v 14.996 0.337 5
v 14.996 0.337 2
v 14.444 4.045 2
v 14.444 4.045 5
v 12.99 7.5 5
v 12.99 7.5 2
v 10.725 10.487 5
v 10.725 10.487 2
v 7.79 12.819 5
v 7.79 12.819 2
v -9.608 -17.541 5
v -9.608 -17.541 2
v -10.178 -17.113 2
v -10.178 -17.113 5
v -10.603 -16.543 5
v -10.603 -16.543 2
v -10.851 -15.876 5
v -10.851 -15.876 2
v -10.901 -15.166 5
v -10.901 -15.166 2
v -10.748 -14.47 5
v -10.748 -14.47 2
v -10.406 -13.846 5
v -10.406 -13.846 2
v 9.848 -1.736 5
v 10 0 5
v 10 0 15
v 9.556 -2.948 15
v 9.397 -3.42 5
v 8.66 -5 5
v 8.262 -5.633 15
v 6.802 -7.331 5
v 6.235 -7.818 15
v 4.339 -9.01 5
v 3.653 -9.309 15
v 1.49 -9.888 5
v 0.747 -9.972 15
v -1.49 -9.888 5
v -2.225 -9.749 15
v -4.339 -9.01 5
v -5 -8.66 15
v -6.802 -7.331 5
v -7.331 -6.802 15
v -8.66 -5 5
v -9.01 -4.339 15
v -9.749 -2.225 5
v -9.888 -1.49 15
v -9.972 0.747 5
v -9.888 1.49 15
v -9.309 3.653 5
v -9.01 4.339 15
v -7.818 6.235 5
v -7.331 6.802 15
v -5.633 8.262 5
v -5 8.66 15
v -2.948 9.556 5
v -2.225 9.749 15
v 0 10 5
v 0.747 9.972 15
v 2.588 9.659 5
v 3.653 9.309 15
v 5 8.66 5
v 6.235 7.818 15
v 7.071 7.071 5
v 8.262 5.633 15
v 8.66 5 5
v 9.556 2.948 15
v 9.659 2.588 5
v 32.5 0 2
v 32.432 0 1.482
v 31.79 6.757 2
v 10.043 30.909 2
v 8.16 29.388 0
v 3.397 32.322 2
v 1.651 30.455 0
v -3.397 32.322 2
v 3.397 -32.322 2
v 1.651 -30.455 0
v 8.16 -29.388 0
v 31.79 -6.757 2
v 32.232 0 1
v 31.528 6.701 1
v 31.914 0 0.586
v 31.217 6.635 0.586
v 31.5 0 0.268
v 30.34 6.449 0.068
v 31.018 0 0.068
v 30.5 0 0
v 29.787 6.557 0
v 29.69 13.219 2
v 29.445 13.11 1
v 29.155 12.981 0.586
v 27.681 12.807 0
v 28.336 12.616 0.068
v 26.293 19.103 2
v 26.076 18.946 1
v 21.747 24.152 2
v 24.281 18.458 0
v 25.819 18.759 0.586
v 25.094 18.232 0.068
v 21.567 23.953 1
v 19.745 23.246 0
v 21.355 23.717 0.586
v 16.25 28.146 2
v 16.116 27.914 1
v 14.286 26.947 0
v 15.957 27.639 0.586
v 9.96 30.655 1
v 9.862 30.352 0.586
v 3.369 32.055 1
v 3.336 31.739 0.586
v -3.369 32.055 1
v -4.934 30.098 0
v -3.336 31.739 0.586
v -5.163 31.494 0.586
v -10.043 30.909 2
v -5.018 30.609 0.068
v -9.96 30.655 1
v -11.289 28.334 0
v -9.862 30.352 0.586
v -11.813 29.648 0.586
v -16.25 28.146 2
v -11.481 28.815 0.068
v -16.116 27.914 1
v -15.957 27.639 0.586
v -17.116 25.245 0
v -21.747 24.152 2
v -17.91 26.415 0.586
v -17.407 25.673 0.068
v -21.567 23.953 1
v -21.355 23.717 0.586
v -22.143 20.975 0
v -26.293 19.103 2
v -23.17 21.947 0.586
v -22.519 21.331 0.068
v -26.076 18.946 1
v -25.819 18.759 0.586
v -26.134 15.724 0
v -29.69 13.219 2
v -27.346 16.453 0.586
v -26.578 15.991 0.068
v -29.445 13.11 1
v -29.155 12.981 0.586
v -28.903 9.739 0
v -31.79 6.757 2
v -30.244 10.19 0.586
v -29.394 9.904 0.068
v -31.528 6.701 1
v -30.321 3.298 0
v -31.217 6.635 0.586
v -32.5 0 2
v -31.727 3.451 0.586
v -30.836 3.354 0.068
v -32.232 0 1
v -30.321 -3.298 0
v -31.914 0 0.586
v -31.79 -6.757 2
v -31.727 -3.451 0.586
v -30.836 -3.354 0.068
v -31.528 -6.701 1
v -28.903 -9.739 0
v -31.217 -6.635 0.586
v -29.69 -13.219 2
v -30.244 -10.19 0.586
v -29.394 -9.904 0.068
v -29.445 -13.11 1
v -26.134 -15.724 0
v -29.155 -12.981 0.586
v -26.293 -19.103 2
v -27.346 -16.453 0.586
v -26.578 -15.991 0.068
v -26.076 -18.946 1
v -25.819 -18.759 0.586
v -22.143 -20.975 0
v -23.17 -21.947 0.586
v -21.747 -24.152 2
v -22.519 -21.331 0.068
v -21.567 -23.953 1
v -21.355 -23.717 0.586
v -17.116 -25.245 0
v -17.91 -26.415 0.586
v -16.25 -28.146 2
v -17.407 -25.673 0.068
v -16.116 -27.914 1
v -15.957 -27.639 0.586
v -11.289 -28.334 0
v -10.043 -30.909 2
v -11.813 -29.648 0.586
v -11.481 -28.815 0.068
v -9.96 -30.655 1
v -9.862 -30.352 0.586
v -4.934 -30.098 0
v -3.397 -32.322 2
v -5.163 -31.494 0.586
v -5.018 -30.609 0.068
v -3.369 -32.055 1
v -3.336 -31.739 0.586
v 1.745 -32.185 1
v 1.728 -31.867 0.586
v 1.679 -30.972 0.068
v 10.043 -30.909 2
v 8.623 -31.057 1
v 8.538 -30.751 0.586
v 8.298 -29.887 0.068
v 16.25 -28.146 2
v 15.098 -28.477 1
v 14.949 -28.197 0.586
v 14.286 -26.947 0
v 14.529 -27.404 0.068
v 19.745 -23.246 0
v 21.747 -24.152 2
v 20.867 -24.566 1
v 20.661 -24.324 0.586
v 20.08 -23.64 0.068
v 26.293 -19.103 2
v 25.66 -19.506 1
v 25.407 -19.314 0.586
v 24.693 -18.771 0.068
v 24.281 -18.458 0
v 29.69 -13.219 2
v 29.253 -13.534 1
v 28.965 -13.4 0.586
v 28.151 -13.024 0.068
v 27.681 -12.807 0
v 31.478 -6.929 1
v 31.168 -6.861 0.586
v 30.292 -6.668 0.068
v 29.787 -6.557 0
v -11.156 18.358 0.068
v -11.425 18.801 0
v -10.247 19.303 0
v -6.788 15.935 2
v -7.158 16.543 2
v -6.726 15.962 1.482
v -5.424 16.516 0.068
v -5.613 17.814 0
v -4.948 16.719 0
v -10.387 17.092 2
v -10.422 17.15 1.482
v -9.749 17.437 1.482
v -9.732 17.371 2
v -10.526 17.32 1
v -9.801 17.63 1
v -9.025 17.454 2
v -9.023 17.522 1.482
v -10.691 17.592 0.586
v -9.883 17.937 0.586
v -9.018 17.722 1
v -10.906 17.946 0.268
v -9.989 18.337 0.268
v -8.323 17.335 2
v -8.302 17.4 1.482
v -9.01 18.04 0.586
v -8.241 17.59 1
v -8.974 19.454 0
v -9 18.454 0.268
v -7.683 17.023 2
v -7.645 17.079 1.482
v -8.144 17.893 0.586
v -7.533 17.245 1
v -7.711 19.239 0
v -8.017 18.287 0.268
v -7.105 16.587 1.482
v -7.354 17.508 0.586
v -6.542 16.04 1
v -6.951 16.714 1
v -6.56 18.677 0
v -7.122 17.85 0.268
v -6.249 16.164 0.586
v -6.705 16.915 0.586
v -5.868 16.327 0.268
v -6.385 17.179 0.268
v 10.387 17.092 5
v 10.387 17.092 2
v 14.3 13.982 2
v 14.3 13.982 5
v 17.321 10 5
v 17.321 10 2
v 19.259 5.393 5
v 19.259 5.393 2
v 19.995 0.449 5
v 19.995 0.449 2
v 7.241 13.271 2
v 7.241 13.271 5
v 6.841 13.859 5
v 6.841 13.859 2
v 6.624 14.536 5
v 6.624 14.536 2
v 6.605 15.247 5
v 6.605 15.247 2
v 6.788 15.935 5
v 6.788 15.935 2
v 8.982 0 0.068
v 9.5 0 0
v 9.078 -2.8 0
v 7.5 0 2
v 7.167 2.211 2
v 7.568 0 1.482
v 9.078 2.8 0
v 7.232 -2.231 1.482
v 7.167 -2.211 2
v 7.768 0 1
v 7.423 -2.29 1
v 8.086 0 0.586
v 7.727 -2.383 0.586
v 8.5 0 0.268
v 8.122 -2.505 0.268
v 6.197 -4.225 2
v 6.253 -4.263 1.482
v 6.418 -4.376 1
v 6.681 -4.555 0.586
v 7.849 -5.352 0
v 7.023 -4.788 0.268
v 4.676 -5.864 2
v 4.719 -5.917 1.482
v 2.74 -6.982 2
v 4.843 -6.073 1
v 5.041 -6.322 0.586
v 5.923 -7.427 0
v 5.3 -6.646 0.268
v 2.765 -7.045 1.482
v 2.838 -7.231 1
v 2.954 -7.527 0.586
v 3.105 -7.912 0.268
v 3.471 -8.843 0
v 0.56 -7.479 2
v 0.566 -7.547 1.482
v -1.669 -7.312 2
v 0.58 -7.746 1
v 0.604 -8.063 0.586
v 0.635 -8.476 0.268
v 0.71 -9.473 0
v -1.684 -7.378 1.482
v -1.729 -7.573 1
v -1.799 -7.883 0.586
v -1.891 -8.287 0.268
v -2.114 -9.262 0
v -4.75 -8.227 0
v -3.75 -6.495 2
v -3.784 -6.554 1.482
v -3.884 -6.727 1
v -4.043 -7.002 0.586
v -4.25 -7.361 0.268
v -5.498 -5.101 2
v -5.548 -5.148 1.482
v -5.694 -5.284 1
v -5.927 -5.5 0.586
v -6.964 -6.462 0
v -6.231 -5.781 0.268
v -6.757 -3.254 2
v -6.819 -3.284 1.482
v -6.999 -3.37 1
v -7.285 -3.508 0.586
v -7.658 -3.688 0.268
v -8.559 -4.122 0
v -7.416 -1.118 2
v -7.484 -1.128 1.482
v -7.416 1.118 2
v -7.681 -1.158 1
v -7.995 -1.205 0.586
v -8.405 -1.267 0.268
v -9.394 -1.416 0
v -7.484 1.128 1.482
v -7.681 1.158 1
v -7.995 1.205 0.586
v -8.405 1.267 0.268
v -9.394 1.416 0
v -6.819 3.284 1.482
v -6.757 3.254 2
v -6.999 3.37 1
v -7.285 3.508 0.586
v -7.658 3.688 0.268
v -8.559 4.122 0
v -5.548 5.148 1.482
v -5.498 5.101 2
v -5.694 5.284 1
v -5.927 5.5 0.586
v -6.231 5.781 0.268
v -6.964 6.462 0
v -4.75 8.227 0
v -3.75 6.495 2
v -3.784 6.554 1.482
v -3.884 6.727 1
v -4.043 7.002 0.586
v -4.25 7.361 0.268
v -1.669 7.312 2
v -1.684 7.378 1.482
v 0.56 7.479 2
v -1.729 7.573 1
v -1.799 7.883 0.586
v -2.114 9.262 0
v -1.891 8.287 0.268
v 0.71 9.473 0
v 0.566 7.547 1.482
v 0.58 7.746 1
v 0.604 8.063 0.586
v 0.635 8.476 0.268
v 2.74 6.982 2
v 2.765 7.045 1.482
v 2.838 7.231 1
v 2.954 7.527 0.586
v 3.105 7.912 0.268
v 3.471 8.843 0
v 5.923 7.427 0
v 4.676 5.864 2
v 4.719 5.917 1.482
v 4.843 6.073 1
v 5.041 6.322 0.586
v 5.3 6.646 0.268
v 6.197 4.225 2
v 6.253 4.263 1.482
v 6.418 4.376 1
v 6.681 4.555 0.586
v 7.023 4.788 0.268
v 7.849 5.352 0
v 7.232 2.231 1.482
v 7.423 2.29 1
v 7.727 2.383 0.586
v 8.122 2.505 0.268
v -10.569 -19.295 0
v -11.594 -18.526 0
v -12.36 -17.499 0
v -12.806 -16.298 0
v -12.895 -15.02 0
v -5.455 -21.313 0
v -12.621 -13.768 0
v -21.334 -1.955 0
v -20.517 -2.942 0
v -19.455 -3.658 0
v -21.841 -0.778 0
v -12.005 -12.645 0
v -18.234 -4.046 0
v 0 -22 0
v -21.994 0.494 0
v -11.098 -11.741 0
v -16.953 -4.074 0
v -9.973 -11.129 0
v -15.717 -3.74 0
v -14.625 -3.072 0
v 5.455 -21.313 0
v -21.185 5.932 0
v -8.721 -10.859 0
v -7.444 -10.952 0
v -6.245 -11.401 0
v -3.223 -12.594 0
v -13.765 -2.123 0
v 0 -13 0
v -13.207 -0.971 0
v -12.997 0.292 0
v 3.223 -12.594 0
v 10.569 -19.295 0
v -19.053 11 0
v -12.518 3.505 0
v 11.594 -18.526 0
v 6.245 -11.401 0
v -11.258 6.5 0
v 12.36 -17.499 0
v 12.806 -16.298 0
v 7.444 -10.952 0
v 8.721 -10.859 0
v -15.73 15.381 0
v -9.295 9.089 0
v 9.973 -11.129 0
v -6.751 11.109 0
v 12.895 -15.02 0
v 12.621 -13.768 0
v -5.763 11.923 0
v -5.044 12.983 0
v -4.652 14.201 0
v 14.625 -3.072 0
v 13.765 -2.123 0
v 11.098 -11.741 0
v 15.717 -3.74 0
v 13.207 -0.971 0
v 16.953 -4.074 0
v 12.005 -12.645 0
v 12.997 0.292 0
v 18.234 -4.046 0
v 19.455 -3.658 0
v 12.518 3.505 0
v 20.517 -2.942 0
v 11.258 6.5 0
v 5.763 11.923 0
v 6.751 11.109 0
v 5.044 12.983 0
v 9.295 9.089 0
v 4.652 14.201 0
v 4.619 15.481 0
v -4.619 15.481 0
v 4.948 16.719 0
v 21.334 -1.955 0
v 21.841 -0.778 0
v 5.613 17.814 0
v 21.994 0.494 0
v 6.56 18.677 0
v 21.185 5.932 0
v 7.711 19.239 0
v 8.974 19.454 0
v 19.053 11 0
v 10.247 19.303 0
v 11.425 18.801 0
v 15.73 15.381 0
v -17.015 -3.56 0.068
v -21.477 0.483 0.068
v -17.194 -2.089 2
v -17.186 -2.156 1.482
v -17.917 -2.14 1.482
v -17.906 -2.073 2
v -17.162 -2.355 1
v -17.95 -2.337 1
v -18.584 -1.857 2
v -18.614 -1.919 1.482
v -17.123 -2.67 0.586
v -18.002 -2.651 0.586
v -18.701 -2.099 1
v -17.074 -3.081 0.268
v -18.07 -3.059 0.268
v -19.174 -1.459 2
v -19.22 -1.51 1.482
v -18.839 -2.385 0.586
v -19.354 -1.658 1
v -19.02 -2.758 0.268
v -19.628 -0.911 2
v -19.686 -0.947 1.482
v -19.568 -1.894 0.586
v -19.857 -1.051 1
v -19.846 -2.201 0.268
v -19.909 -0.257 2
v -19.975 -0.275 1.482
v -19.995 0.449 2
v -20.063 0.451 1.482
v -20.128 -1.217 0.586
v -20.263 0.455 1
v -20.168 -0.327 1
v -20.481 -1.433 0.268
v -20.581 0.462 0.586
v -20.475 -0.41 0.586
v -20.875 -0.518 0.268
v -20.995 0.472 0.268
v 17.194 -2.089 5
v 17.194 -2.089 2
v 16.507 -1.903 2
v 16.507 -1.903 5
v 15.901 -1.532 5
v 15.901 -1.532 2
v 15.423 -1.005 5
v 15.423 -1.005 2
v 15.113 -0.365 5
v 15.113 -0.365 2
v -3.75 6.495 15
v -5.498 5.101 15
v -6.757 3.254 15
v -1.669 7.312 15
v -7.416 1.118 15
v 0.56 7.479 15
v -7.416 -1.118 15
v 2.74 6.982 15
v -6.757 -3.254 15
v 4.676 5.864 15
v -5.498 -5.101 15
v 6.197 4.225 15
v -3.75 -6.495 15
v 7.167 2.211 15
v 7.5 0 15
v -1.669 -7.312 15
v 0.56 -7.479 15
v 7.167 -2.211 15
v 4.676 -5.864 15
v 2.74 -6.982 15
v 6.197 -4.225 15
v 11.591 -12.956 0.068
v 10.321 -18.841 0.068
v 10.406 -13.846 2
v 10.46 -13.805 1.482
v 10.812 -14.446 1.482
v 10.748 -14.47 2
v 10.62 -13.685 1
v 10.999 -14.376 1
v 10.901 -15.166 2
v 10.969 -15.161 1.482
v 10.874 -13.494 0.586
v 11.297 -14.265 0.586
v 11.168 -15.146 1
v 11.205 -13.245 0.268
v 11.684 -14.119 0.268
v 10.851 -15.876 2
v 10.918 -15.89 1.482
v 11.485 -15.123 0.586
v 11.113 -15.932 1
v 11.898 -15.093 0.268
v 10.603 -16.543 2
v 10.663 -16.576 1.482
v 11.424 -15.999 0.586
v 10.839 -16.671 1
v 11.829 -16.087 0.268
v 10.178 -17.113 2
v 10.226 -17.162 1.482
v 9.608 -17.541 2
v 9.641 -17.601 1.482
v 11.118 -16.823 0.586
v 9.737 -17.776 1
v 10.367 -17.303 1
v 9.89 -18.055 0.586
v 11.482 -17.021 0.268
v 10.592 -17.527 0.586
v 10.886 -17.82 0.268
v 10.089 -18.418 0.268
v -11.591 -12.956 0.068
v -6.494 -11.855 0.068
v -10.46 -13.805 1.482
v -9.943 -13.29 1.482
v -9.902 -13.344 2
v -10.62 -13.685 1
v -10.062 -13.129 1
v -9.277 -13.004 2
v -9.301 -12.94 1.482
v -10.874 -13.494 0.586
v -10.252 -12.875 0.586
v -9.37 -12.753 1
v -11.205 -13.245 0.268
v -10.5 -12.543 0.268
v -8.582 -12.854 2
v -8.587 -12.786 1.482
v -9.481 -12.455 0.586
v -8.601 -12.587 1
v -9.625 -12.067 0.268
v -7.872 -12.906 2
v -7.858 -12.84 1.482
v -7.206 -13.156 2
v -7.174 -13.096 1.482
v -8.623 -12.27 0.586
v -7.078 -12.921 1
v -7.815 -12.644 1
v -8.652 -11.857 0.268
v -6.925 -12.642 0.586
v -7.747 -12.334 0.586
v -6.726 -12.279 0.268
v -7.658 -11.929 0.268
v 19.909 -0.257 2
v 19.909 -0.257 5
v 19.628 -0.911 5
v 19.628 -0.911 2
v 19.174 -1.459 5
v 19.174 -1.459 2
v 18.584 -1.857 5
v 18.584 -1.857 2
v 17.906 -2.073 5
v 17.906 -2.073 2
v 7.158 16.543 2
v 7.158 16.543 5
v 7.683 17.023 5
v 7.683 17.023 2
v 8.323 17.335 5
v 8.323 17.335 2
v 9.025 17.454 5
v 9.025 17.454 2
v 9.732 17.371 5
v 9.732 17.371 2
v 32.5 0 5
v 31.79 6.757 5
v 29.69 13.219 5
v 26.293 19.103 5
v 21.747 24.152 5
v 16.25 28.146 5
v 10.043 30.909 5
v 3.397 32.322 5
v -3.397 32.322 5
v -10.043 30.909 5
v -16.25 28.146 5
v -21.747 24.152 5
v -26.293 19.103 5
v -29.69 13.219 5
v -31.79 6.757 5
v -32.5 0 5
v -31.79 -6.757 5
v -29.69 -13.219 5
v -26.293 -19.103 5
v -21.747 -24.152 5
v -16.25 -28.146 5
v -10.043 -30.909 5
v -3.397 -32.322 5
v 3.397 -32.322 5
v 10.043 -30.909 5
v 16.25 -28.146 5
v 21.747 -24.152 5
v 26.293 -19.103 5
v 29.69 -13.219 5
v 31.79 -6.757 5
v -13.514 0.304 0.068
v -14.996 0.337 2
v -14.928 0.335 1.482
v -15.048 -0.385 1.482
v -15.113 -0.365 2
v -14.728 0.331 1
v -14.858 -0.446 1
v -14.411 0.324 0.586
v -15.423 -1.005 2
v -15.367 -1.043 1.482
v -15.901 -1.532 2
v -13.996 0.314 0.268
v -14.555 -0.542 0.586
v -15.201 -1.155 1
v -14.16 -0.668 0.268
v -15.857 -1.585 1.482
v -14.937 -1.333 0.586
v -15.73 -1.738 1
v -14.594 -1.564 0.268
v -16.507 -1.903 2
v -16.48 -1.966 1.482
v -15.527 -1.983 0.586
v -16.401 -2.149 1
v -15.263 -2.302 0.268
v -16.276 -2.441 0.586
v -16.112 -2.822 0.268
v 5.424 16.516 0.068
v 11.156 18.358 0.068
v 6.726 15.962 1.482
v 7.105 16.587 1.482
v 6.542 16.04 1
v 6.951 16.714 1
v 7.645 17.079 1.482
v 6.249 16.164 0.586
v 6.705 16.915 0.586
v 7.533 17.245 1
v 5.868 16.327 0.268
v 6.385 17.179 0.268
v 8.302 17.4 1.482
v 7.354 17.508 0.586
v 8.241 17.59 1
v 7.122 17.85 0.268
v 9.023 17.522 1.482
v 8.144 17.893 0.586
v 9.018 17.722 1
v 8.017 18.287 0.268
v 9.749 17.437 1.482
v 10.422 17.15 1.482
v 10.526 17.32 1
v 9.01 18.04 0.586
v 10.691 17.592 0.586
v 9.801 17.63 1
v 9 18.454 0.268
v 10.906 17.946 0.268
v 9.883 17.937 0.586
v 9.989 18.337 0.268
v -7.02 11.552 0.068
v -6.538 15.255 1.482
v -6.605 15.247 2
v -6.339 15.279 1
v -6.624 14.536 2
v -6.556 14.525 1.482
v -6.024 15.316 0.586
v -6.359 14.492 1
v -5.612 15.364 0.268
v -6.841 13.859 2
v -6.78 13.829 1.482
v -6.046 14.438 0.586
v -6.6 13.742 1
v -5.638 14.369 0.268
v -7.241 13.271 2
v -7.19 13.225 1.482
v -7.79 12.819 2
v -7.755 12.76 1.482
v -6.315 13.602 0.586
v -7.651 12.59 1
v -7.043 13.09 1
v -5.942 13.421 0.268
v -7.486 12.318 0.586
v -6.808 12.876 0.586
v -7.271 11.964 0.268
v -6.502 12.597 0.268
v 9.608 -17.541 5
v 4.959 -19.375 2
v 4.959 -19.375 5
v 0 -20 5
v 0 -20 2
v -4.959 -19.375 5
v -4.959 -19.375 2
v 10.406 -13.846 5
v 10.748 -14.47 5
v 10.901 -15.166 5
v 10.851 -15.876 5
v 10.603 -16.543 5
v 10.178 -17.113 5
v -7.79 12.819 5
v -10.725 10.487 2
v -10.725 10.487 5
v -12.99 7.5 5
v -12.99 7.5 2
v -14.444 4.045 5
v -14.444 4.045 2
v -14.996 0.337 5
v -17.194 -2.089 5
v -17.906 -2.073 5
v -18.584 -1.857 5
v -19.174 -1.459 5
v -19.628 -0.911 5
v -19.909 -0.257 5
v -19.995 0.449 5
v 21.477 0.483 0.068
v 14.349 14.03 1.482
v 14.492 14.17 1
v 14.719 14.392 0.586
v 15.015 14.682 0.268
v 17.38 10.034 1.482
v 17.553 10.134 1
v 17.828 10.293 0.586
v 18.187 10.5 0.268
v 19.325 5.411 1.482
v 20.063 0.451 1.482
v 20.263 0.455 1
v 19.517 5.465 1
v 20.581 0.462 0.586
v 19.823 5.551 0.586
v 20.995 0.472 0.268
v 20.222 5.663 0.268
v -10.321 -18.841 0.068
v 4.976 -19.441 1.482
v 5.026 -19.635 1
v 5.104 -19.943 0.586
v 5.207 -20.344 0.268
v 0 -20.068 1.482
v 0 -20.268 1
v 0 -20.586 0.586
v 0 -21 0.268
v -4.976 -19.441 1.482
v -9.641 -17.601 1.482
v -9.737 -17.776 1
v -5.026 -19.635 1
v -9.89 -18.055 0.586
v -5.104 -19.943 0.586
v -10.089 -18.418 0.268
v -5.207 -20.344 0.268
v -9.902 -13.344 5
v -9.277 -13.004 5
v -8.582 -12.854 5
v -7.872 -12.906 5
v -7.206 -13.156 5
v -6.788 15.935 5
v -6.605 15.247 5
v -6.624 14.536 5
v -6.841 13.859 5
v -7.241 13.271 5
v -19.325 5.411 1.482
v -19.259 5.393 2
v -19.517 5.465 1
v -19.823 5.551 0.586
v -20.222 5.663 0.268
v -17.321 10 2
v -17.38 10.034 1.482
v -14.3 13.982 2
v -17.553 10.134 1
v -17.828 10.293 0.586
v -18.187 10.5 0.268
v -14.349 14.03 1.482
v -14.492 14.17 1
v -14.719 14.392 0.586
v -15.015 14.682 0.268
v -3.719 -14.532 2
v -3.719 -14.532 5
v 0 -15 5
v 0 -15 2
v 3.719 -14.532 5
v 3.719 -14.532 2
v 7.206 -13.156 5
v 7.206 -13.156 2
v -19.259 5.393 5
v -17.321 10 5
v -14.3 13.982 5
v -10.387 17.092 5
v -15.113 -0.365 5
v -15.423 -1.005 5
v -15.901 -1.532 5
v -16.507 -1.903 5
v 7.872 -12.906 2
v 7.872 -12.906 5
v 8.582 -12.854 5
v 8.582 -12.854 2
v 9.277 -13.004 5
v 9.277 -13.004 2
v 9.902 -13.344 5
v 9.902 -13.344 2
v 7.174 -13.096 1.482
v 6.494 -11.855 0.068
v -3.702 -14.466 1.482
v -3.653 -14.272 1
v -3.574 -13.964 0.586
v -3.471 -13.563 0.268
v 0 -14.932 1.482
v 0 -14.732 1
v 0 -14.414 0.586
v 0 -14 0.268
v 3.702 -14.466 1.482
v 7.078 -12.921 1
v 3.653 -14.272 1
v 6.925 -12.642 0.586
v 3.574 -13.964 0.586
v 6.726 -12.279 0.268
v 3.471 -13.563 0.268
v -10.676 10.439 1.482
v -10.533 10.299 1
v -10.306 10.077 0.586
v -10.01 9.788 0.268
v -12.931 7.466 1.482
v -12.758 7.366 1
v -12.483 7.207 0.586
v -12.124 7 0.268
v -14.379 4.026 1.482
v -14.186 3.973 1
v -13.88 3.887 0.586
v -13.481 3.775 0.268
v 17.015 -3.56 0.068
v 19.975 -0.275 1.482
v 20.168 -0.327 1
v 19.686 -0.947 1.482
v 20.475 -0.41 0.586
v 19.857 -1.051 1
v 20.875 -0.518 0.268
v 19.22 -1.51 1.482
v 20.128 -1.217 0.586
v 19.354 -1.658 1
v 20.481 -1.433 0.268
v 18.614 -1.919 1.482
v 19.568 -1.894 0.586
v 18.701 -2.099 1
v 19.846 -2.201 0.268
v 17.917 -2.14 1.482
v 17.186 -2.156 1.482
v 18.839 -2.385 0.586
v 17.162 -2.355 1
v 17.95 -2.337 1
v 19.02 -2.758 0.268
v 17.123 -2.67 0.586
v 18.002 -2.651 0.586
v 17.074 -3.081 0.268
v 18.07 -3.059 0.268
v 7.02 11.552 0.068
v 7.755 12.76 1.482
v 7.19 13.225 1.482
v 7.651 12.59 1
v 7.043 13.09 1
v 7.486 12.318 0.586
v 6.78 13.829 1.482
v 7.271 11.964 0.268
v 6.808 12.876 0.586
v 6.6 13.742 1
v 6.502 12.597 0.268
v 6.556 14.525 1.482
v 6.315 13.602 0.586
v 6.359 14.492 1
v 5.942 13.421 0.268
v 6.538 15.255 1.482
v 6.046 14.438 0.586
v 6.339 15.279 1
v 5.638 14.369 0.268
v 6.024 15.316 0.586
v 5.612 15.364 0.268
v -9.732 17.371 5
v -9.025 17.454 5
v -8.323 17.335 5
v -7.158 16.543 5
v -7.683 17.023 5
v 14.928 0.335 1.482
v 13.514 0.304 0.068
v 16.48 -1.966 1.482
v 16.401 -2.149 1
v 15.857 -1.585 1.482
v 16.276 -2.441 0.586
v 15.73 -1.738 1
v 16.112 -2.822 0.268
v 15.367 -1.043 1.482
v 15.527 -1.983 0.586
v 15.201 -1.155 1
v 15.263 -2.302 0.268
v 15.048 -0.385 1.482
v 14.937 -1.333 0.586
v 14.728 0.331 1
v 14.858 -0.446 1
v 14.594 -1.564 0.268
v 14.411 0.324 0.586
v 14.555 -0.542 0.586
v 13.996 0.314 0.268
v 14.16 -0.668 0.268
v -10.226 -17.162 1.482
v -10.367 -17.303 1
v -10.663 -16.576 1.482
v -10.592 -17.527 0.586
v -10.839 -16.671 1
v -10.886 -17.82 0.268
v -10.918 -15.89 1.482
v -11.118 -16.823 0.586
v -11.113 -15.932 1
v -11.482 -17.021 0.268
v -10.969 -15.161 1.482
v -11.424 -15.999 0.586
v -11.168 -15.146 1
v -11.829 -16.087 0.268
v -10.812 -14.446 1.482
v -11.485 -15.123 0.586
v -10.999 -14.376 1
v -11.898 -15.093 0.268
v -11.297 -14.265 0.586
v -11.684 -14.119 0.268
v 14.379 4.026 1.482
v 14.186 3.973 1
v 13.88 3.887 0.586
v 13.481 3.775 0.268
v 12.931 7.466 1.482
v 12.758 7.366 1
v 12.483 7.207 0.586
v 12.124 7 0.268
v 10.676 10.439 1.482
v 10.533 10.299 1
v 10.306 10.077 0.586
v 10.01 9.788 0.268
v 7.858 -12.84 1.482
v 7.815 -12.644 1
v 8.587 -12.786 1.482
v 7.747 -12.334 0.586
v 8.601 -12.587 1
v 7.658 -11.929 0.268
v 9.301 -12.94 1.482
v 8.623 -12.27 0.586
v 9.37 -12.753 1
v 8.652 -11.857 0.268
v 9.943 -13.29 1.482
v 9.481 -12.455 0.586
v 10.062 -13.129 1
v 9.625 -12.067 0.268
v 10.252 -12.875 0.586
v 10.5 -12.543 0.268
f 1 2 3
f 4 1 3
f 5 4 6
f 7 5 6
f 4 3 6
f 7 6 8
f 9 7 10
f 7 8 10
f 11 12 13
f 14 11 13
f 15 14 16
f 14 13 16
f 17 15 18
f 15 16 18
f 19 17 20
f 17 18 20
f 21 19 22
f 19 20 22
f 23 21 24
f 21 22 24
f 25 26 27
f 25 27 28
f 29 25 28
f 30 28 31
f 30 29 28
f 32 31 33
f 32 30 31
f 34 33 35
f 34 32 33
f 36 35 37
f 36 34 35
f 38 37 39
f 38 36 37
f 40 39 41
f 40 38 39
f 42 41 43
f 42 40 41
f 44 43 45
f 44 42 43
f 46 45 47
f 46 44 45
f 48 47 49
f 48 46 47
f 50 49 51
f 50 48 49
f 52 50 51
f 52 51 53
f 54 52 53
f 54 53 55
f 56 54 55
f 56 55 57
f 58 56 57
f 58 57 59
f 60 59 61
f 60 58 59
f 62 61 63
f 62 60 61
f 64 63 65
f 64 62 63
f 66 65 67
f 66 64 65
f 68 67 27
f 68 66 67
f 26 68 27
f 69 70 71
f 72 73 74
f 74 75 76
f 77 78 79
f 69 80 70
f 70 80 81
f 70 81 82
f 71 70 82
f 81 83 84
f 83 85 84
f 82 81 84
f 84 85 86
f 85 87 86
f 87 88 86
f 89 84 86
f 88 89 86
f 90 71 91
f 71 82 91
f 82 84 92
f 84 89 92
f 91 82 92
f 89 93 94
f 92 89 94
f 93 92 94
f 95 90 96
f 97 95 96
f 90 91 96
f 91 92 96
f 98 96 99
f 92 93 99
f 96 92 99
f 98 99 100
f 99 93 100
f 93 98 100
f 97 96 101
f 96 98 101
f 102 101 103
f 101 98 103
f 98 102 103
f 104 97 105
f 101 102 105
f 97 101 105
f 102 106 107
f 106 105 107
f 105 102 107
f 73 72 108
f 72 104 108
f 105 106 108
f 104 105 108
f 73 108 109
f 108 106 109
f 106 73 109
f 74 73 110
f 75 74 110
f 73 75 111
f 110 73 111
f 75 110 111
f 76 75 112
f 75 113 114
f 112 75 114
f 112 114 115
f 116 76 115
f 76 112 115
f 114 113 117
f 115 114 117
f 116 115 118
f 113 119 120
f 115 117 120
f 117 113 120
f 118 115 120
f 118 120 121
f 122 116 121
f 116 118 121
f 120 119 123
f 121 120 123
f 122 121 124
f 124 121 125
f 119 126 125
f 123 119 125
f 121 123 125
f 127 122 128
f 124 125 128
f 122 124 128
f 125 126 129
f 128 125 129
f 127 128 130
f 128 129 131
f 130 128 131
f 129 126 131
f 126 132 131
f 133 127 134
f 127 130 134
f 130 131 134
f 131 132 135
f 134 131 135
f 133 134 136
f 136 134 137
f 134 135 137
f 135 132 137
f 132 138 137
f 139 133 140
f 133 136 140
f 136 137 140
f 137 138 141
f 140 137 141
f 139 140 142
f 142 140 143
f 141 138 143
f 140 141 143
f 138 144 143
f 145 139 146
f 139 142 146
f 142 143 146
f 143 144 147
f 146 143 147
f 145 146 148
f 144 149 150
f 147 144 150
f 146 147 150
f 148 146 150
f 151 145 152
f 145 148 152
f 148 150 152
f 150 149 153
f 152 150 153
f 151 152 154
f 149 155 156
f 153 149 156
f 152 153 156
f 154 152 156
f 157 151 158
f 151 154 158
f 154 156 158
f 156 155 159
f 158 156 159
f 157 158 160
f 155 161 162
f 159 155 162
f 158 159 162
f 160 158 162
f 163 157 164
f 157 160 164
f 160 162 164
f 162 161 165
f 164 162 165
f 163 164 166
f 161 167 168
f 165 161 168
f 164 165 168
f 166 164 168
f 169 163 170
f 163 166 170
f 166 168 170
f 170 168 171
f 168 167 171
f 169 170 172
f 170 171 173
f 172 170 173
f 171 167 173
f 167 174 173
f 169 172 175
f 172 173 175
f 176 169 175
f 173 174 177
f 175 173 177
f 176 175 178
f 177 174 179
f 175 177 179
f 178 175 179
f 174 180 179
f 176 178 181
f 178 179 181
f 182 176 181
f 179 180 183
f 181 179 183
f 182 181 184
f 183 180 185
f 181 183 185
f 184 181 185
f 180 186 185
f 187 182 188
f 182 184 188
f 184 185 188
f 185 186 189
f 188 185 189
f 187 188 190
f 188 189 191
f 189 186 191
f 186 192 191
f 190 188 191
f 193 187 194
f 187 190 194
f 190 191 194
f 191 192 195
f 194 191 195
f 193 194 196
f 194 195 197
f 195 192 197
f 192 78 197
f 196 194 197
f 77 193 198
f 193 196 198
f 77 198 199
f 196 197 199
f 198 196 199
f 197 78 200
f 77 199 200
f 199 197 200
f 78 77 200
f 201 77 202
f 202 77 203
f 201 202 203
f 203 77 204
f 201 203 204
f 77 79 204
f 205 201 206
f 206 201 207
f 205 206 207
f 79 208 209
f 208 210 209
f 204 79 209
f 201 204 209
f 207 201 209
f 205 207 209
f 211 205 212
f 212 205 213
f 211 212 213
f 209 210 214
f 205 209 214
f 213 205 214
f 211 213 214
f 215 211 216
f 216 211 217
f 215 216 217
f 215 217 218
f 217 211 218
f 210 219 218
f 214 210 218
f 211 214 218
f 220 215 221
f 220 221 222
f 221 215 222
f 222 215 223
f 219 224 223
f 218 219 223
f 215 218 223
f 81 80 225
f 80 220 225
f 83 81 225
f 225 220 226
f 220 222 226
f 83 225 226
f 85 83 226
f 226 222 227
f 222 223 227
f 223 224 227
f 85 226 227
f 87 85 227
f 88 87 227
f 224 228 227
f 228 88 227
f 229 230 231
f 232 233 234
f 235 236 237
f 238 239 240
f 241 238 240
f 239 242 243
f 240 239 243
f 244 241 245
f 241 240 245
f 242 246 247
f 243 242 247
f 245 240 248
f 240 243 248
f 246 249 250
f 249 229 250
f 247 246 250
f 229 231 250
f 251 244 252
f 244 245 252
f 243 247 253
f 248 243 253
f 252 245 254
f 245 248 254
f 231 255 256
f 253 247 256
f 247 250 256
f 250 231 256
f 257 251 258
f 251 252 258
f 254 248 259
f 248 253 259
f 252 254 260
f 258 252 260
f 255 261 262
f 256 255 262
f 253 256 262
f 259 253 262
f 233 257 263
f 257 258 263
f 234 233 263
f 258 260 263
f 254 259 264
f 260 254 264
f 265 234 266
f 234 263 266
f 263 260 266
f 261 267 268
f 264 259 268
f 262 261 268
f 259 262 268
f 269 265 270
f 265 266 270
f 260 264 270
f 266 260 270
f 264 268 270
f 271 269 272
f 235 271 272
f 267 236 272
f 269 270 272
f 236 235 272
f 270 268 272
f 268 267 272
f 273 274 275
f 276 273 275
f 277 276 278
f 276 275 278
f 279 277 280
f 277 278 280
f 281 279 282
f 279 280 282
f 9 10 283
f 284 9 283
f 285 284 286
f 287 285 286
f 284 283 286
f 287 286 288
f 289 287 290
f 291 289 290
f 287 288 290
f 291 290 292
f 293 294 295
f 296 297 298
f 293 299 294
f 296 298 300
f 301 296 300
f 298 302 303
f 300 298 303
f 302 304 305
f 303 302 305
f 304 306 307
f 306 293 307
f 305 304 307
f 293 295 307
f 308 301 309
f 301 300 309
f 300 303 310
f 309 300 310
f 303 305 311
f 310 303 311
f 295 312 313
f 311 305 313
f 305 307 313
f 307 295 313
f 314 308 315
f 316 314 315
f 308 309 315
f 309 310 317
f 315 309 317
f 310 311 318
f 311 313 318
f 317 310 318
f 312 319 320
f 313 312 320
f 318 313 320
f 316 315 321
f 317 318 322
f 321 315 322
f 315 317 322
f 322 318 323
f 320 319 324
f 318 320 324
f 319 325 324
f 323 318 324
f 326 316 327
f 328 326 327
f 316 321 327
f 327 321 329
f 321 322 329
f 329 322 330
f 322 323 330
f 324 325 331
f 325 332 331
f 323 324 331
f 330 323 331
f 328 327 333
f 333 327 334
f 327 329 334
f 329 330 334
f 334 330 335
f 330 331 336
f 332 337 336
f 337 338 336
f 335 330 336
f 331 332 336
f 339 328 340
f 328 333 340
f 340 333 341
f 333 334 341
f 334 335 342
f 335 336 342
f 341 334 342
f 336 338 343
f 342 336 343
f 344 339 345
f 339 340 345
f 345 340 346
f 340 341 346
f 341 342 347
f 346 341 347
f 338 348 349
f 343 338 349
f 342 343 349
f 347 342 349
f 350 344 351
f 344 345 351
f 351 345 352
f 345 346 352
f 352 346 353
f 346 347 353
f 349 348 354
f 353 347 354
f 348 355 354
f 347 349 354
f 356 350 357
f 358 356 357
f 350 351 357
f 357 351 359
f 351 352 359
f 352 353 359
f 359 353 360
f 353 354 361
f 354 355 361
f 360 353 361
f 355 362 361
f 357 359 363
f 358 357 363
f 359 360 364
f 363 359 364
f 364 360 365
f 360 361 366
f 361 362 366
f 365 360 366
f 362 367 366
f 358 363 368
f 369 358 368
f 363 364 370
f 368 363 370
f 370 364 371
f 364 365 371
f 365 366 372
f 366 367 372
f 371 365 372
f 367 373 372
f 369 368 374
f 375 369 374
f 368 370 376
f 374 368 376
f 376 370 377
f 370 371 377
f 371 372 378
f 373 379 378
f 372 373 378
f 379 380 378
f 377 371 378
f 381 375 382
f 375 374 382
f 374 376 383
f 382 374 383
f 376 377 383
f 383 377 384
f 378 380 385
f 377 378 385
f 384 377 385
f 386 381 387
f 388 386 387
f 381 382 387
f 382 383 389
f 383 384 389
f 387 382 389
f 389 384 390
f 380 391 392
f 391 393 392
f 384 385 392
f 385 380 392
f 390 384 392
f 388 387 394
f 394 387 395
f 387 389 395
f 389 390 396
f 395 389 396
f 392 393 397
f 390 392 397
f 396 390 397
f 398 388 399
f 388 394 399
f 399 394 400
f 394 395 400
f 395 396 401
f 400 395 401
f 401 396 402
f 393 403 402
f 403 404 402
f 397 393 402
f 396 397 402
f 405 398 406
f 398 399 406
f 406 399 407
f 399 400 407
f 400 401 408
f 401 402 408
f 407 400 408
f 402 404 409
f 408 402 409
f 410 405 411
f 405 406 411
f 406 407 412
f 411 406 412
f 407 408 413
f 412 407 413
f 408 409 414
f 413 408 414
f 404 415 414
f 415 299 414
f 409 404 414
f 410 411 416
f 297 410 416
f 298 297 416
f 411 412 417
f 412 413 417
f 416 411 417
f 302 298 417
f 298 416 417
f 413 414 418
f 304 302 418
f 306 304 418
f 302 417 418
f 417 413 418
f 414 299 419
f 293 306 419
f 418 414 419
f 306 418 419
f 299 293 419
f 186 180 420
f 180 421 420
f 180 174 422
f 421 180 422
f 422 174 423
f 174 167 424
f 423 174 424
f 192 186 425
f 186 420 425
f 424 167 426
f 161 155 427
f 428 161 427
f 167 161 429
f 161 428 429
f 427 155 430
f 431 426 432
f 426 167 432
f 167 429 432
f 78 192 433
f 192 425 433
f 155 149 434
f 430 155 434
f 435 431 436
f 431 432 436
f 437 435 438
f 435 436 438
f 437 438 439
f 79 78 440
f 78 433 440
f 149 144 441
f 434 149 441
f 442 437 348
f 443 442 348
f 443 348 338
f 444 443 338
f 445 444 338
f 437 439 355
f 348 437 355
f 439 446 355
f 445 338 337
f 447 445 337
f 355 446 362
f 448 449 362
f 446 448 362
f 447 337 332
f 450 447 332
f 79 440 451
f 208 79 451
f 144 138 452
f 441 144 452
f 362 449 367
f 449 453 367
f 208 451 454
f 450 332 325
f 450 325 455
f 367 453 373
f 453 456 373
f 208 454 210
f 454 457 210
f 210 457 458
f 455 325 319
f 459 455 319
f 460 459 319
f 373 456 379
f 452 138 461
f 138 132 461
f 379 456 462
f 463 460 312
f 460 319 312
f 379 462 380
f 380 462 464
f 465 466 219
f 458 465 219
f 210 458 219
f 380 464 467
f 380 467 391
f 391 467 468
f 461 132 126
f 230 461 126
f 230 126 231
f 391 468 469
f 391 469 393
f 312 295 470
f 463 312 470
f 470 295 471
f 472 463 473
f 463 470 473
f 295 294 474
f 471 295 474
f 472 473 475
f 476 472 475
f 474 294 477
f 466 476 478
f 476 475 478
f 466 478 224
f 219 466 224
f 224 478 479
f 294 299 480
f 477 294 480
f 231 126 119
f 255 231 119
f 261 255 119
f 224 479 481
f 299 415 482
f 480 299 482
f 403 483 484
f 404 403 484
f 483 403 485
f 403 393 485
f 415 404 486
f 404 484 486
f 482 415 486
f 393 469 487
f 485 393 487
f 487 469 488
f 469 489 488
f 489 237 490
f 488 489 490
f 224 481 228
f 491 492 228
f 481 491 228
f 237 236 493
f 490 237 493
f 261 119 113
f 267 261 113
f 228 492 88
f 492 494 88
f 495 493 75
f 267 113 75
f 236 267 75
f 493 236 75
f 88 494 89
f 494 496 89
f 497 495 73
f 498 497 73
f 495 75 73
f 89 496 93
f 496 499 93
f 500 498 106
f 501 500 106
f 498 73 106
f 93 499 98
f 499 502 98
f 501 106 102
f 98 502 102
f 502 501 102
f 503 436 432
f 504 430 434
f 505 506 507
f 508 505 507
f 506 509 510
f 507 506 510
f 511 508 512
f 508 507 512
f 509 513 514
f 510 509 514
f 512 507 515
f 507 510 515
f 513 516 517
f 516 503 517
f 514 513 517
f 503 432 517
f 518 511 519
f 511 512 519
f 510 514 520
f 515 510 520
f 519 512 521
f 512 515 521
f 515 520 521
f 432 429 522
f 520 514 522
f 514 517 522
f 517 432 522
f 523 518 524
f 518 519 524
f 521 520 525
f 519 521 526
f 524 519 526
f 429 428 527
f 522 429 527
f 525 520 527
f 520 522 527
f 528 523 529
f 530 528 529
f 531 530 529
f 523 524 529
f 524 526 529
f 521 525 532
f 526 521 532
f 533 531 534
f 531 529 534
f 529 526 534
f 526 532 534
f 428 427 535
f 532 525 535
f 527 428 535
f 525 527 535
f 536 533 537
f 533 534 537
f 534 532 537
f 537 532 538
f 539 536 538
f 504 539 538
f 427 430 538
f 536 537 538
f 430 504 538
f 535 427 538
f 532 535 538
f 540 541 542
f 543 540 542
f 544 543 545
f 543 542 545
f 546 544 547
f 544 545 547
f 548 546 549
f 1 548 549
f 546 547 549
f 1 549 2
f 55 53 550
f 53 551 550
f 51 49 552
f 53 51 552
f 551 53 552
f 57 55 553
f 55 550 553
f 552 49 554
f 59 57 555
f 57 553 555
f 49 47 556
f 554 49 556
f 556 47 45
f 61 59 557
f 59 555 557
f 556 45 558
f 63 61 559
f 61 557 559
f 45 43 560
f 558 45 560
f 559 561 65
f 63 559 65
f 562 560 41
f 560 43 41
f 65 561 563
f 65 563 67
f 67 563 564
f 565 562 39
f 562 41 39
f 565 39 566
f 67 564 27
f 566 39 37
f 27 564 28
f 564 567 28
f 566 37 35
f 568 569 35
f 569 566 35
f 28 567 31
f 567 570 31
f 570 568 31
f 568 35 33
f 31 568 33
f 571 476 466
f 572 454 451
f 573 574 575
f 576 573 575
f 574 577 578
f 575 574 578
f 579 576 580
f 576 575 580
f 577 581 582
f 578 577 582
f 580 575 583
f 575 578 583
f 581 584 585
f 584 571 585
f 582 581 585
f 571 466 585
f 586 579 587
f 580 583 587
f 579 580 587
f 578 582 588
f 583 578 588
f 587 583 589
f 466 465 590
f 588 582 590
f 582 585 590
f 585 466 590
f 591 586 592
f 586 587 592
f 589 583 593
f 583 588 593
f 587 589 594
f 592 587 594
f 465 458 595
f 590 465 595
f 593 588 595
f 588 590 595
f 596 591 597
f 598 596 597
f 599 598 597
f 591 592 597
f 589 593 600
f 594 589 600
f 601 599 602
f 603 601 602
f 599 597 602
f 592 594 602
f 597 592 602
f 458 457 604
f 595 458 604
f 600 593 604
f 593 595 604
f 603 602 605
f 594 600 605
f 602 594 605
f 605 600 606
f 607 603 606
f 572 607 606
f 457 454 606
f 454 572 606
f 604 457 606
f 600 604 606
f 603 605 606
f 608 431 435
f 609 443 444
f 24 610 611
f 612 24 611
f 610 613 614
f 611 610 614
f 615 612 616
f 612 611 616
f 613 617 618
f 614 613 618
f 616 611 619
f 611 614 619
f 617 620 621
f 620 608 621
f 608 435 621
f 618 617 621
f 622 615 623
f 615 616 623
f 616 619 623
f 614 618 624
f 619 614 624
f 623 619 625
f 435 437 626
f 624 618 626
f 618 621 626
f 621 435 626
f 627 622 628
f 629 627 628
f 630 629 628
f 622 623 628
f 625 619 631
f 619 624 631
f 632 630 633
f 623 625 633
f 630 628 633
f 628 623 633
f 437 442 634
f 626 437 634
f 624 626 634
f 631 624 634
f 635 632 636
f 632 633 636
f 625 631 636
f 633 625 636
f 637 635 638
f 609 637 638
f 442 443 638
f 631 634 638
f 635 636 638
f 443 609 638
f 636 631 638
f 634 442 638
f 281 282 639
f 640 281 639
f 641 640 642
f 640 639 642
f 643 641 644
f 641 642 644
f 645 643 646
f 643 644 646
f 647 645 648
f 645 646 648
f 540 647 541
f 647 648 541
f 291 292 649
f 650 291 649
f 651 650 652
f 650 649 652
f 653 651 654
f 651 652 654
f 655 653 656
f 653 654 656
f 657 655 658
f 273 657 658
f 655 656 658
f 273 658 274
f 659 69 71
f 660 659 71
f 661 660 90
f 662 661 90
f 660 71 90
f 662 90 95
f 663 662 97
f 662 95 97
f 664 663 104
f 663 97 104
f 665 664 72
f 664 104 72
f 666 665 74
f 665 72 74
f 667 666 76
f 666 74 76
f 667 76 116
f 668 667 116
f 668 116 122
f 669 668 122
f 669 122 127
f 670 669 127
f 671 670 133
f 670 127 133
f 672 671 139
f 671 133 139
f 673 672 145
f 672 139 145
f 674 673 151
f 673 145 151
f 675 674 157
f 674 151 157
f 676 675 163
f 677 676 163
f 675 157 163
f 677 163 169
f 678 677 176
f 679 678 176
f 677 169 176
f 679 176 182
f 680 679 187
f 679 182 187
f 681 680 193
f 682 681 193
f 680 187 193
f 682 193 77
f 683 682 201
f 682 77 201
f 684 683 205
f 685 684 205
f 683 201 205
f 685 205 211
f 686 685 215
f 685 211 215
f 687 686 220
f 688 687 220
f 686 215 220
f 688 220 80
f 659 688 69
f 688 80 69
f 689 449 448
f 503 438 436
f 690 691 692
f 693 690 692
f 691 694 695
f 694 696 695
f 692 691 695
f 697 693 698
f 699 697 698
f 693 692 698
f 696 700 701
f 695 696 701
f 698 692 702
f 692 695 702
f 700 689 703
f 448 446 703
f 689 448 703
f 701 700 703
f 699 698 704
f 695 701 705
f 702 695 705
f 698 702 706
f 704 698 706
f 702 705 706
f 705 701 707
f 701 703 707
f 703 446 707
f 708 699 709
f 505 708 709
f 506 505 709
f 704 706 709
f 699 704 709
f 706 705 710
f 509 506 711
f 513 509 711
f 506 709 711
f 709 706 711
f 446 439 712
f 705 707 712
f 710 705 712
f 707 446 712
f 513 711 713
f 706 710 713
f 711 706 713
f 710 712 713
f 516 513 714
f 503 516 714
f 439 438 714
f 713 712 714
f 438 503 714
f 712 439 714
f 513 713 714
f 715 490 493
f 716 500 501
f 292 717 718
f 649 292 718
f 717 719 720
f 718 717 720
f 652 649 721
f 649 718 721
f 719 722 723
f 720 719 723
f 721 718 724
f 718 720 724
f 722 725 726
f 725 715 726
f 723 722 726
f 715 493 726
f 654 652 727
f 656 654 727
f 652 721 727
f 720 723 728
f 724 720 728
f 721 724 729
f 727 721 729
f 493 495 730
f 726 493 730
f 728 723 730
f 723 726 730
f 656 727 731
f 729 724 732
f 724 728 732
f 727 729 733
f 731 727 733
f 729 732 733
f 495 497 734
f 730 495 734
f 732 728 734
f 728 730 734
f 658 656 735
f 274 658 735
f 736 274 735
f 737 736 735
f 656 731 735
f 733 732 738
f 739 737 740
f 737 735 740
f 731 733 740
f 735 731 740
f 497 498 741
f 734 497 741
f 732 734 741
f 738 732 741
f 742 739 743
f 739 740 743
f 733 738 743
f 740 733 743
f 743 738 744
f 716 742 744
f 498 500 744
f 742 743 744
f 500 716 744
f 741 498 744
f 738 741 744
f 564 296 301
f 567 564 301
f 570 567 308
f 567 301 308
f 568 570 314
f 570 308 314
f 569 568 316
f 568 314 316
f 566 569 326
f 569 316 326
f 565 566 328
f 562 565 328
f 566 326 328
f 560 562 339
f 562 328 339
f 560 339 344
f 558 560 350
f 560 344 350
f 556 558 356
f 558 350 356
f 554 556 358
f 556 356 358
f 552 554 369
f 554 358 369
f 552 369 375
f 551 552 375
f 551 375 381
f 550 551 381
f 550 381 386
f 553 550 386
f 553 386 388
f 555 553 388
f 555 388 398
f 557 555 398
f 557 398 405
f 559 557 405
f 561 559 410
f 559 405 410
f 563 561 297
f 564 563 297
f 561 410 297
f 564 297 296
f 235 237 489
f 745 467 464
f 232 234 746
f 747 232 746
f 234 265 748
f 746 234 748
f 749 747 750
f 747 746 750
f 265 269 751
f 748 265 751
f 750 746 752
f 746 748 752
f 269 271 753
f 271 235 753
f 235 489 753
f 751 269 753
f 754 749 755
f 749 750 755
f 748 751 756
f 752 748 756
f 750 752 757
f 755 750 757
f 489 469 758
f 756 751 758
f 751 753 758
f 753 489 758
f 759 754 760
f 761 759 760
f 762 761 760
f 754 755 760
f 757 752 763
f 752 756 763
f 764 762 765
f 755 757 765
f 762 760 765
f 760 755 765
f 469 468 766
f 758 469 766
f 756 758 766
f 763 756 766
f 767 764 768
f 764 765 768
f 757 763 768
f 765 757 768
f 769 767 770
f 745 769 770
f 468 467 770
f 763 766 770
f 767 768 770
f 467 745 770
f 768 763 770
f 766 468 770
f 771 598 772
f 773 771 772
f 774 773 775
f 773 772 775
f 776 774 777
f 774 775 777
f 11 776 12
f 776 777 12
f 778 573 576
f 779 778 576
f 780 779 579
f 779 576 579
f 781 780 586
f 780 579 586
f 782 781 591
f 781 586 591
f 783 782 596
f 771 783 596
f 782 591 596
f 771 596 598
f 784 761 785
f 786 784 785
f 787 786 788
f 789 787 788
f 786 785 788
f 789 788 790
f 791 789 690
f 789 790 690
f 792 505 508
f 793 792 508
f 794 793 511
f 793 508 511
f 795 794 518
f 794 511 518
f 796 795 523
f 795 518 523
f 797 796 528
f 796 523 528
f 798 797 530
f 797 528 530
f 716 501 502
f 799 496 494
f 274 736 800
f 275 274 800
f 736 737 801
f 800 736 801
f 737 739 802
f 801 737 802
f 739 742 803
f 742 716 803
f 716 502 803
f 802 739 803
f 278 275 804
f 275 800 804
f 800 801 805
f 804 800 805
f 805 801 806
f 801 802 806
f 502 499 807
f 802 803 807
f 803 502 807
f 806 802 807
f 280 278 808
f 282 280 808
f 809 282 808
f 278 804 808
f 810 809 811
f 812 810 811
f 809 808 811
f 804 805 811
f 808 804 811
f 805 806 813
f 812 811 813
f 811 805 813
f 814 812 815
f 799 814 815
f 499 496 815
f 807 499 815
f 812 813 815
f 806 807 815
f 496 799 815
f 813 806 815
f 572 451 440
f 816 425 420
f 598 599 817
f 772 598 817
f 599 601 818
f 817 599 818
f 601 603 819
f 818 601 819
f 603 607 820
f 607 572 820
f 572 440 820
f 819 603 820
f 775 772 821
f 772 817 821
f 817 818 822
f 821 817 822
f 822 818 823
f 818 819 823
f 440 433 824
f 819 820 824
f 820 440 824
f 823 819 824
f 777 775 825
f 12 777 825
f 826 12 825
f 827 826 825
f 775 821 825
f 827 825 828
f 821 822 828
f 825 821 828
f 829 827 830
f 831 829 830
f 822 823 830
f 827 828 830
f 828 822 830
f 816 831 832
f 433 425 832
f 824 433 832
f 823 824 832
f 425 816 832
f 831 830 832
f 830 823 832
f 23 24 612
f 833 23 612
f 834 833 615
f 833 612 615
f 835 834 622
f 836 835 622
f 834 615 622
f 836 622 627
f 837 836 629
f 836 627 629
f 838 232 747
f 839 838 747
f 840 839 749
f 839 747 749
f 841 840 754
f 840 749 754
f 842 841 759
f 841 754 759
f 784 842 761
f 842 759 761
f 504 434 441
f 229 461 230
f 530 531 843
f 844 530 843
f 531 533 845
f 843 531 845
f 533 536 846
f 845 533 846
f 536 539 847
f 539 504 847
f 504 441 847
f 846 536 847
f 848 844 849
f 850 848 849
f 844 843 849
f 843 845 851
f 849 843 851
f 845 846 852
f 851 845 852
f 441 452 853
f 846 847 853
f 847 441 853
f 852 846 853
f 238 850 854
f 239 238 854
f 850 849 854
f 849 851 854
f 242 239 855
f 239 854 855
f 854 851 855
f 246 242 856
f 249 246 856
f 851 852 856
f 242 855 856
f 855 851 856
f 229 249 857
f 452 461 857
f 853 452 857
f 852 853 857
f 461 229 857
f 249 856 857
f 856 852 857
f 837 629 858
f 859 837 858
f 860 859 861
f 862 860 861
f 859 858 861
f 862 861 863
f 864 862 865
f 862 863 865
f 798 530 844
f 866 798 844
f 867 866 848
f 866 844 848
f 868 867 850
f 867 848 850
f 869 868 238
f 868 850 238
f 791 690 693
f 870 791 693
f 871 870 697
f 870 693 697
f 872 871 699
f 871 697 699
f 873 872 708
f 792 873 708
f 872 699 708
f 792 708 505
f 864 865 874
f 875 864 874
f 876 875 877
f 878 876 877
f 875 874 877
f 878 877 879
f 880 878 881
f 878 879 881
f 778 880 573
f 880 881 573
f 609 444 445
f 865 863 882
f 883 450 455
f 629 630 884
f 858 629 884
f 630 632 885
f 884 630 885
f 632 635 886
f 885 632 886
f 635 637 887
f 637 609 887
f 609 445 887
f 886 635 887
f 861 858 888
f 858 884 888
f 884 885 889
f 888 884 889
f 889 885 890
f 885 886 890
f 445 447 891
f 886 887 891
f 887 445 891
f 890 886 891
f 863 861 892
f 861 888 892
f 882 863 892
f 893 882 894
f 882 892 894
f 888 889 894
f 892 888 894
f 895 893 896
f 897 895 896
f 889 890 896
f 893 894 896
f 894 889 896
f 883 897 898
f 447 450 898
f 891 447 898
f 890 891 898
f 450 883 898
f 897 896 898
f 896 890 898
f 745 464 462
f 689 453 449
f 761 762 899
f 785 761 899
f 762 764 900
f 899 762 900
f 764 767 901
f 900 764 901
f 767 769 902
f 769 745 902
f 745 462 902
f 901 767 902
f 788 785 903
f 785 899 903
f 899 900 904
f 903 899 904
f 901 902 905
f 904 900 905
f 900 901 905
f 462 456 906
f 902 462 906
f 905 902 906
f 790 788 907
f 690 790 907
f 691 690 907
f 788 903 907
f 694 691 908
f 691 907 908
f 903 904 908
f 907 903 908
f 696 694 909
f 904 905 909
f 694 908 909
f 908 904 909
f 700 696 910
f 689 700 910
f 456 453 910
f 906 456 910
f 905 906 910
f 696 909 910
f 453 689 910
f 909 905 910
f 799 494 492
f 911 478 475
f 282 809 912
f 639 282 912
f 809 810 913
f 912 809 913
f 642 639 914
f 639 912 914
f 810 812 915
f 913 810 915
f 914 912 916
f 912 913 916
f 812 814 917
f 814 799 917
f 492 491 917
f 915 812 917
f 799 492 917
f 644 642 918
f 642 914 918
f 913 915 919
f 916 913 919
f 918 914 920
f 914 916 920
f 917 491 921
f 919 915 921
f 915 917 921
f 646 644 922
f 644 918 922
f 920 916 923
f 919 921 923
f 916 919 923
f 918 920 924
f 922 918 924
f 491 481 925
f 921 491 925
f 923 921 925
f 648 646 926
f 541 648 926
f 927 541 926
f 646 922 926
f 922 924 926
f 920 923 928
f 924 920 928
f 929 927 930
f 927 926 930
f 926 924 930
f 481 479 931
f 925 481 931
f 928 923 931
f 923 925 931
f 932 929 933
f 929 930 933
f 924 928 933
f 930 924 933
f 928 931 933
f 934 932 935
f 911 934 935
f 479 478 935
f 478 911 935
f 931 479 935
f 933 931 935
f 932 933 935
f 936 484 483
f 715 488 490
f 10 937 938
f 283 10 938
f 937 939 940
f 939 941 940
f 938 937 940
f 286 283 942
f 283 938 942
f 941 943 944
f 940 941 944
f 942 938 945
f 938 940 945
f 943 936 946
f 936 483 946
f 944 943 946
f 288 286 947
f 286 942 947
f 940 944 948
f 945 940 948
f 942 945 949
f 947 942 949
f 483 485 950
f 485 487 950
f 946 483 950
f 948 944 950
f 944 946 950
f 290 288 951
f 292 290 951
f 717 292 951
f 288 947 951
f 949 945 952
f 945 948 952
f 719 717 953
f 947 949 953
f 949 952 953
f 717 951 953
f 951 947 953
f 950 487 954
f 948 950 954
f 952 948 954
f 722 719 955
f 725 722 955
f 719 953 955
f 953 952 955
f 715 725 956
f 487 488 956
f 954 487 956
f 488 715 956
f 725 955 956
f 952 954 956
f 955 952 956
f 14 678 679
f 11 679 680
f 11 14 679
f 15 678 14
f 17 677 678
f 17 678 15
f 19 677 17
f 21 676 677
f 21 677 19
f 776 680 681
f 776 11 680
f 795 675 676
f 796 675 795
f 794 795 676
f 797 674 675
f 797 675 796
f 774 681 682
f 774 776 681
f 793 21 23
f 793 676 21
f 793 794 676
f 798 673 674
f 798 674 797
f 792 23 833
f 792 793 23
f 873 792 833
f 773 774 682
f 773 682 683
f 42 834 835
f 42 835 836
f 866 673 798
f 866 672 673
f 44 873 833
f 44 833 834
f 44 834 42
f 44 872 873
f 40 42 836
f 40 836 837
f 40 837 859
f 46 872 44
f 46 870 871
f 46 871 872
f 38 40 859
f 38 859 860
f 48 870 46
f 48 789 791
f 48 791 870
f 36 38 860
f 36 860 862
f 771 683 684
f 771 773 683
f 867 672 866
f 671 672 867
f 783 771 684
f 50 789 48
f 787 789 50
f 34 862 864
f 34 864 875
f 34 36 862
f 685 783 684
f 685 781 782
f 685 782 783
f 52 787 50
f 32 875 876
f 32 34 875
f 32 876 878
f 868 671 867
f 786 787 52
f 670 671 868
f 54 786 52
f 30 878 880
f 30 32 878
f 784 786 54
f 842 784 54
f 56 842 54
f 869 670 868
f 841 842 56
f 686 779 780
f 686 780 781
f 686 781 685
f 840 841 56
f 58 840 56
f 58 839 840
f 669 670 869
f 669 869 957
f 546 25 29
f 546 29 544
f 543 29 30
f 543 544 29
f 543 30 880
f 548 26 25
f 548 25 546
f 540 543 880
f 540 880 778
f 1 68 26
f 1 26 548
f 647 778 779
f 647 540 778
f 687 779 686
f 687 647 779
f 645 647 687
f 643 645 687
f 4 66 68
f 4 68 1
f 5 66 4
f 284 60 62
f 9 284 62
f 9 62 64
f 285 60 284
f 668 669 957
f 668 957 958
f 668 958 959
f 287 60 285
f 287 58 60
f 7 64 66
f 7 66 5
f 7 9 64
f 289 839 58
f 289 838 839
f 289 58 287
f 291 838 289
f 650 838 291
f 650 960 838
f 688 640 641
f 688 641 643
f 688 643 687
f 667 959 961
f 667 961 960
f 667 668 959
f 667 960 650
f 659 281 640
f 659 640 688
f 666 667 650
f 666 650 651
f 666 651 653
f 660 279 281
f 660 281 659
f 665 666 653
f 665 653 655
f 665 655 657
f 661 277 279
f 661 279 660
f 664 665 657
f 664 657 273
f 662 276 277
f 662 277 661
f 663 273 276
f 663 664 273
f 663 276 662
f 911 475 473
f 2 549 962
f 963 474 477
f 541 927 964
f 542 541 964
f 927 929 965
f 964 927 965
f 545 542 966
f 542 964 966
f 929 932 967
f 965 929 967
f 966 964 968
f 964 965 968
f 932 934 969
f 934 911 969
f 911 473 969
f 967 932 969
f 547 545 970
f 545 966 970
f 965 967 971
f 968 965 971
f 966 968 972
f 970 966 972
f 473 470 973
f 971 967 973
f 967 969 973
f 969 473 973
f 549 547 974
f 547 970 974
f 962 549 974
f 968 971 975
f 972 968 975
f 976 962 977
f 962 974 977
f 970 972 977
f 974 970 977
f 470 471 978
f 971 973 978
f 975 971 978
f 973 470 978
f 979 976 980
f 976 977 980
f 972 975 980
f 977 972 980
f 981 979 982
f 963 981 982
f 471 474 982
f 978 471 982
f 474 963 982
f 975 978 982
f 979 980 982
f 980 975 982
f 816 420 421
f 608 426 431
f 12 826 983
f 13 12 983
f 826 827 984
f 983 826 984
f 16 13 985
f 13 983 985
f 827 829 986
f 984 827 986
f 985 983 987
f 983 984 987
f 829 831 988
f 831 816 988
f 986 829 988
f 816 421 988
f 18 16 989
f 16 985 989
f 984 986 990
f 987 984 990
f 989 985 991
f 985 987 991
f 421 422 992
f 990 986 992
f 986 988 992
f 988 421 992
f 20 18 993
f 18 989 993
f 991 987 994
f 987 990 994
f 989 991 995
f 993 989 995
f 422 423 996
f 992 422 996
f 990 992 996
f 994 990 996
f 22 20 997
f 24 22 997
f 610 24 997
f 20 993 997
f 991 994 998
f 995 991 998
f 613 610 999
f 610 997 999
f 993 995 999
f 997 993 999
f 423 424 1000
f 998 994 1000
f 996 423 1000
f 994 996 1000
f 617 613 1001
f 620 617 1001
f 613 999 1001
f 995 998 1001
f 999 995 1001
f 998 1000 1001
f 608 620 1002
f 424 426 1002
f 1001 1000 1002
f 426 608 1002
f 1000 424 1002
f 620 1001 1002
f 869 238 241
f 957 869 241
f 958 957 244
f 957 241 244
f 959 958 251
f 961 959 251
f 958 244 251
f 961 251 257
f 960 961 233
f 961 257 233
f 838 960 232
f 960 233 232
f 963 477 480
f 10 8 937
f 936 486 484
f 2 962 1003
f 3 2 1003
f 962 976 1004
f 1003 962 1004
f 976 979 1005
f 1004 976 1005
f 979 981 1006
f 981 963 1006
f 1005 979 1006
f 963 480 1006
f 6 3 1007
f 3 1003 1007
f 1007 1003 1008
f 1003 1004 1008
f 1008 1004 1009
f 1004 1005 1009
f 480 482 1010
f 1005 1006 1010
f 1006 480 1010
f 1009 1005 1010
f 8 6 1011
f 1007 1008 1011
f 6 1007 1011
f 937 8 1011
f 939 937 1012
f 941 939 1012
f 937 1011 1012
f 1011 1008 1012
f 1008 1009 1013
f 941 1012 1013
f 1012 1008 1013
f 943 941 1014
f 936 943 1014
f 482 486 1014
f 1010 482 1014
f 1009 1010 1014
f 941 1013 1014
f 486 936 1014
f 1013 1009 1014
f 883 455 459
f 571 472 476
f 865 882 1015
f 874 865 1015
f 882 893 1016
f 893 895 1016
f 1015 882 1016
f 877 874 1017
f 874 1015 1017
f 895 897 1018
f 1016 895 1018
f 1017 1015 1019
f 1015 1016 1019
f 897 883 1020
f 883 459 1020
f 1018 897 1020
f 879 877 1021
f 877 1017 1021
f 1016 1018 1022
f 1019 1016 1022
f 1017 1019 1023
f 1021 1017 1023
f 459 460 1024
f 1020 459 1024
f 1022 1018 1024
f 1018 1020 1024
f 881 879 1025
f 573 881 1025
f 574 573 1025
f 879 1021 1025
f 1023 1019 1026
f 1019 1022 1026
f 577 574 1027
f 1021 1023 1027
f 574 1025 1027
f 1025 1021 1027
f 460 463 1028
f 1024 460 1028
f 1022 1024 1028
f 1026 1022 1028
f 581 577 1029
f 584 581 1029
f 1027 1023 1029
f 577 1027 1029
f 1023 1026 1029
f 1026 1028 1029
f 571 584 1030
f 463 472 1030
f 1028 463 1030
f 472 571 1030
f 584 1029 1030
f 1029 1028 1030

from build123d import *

# Parameters (mm, degrees)
F0_R     = 32.5
F1_DEPTH = 5
F2_R     = 10
F2_R_2   = 7.5
F3_DEPTH = 15
F4_R     = 2


with BuildPart() as f1:
    # F0 (on Top) → F1 (new body)
    with BuildSketch(Plane.XY):
        Circle(F0_R)
        with BuildLine():
            ThreePointArc((-9.6084106433, -17.5407652316), (-10.8510784968, -15.8756509046), (-10.4058874503, -13.8462090975))
            ThreePointArc((-10.4058874503, -13.8462090975), (-8.9348406398, -12.9044503937), (-7.2063079825, -13.1555739237))
            ThreePointArc((-7.2063079825, -13.1555739237), (0, -15), (7.2063079825, -13.1555739237))
            ThreePointArc((7.2063079825, -13.1555739237), (8.9348406398, -12.9044503937), (10.4058874503, -13.8462090975))
            ThreePointArc((10.4058874503, -13.8462090975), (10.8510784968, -15.8756509046), (9.6084106433, -17.5407652316))
            ThreePointArc((9.6084106433, -17.5407652316), (0, -20), (-9.6084106433, -17.5407652316))
        make_face(mode=Mode.SUBTRACT)
        with BuildLine():
            ThreePointArc((-19.994953614, 0.4492549087), (-17.3205080757, 10), (-10.3865429707, 17.0915103229))
            ThreePointArc((-10.3865429707, 17.0915103229), (-8.3231777366, 17.335135089), (-6.7882250994, 15.9348674296))
            ThreePointArc((-6.7882250994, 15.9348674296), (-6.708161543, 14.1900241697), (-7.789907228, 12.8186327422))
            ThreePointArc((-7.789907228, 12.8186327422), (-12.9903810568, 7.5), (-14.9962152105, 0.3369411815))
            ThreePointArc((-14.9962152105, 0.3369411815), (-15.6430021828, -1.285573776), (-17.1941125497, -2.0886583321))
            ThreePointArc((-17.1941125497, -2.0886583321), (-19.1742562334, -1.4594841844), (-19.994953614, 0.4492549087))
        make_face(mode=Mode.SUBTRACT)
        with BuildLine():
            ThreePointArc((0, 10), (7.0710678119, 7.0710678119), (10, 0))
            ThreePointArc((10, 0), (9.6592582629, -2.588190451), (8.6602540378, -5))
            ThreePointArc((8.6602540378, -5), (0, -10), (-8.6602540378, -5))
            ThreePointArc((-8.6602540378, -5), (-8.6602540378, 5), (0, 10))
        make_face(mode=Mode.SUBTRACT)
        with BuildLine():
            ThreePointArc((19.994953614, 0.4492549087), (19.1742562334, -1.4594841844), (17.1941125497, -2.0886583321))
            ThreePointArc((17.1941125497, -2.0886583321), (15.6430021828, -1.285573776), (14.9962152105, 0.3369411815))
            ThreePointArc((14.9962152105, 0.3369411815), (12.9903810568, 7.5), (7.789907228, 12.8186327422))
            ThreePointArc((7.789907228, 12.8186327422), (6.708161543, 14.1900241697), (6.7882250994, 15.9348674296))
            ThreePointArc((6.7882250994, 15.9348674296), (8.3231777366, 17.335135089), (10.3865429707, 17.0915103229))
            ThreePointArc((10.3865429707, 17.0915103229), (17.3205080757, 10), (19.994953614, 0.4492549087))
        make_face(mode=Mode.SUBTRACT)
    extrude(amount=F1_DEPTH)

    # F2 (on face) → F3 (join)
    with BuildSketch(Plane(origin=(0, 0, 0), x_dir=(1, 0, 0), z_dir=(0, 0, -1))):
        Circle(F2_R)
        Circle(F2_R_2, mode=Mode.SUBTRACT)
    extrude(amount=-F3_DEPTH)

    # F4
    f4_edges = [f1.edges().sort_by_distance(p)[0] for p in [
        (-32.5, 0, 0),
        (-10.599955, -14.147118, 0),
        (0, -15, 0),
        (10.599955, -14.147118, 0),
        (0, -20, 0),
        (-17.551741, -2.106271, 0),
        (-17.320508, 10, 0),
        (-6.951786, 16.253389, 0),
        (-12.990381, 7.5, 0),
        (17.320508, 10, 0),
        (17.551741, -2.106271, 0),
        (12.990381, 7.5, 0),
        (6.951786, 16.253389, 0),
        (-7.5, 0, 0),
    ]]
    fillet(f4_edges, radius=F4_R)


solid = f1.part
